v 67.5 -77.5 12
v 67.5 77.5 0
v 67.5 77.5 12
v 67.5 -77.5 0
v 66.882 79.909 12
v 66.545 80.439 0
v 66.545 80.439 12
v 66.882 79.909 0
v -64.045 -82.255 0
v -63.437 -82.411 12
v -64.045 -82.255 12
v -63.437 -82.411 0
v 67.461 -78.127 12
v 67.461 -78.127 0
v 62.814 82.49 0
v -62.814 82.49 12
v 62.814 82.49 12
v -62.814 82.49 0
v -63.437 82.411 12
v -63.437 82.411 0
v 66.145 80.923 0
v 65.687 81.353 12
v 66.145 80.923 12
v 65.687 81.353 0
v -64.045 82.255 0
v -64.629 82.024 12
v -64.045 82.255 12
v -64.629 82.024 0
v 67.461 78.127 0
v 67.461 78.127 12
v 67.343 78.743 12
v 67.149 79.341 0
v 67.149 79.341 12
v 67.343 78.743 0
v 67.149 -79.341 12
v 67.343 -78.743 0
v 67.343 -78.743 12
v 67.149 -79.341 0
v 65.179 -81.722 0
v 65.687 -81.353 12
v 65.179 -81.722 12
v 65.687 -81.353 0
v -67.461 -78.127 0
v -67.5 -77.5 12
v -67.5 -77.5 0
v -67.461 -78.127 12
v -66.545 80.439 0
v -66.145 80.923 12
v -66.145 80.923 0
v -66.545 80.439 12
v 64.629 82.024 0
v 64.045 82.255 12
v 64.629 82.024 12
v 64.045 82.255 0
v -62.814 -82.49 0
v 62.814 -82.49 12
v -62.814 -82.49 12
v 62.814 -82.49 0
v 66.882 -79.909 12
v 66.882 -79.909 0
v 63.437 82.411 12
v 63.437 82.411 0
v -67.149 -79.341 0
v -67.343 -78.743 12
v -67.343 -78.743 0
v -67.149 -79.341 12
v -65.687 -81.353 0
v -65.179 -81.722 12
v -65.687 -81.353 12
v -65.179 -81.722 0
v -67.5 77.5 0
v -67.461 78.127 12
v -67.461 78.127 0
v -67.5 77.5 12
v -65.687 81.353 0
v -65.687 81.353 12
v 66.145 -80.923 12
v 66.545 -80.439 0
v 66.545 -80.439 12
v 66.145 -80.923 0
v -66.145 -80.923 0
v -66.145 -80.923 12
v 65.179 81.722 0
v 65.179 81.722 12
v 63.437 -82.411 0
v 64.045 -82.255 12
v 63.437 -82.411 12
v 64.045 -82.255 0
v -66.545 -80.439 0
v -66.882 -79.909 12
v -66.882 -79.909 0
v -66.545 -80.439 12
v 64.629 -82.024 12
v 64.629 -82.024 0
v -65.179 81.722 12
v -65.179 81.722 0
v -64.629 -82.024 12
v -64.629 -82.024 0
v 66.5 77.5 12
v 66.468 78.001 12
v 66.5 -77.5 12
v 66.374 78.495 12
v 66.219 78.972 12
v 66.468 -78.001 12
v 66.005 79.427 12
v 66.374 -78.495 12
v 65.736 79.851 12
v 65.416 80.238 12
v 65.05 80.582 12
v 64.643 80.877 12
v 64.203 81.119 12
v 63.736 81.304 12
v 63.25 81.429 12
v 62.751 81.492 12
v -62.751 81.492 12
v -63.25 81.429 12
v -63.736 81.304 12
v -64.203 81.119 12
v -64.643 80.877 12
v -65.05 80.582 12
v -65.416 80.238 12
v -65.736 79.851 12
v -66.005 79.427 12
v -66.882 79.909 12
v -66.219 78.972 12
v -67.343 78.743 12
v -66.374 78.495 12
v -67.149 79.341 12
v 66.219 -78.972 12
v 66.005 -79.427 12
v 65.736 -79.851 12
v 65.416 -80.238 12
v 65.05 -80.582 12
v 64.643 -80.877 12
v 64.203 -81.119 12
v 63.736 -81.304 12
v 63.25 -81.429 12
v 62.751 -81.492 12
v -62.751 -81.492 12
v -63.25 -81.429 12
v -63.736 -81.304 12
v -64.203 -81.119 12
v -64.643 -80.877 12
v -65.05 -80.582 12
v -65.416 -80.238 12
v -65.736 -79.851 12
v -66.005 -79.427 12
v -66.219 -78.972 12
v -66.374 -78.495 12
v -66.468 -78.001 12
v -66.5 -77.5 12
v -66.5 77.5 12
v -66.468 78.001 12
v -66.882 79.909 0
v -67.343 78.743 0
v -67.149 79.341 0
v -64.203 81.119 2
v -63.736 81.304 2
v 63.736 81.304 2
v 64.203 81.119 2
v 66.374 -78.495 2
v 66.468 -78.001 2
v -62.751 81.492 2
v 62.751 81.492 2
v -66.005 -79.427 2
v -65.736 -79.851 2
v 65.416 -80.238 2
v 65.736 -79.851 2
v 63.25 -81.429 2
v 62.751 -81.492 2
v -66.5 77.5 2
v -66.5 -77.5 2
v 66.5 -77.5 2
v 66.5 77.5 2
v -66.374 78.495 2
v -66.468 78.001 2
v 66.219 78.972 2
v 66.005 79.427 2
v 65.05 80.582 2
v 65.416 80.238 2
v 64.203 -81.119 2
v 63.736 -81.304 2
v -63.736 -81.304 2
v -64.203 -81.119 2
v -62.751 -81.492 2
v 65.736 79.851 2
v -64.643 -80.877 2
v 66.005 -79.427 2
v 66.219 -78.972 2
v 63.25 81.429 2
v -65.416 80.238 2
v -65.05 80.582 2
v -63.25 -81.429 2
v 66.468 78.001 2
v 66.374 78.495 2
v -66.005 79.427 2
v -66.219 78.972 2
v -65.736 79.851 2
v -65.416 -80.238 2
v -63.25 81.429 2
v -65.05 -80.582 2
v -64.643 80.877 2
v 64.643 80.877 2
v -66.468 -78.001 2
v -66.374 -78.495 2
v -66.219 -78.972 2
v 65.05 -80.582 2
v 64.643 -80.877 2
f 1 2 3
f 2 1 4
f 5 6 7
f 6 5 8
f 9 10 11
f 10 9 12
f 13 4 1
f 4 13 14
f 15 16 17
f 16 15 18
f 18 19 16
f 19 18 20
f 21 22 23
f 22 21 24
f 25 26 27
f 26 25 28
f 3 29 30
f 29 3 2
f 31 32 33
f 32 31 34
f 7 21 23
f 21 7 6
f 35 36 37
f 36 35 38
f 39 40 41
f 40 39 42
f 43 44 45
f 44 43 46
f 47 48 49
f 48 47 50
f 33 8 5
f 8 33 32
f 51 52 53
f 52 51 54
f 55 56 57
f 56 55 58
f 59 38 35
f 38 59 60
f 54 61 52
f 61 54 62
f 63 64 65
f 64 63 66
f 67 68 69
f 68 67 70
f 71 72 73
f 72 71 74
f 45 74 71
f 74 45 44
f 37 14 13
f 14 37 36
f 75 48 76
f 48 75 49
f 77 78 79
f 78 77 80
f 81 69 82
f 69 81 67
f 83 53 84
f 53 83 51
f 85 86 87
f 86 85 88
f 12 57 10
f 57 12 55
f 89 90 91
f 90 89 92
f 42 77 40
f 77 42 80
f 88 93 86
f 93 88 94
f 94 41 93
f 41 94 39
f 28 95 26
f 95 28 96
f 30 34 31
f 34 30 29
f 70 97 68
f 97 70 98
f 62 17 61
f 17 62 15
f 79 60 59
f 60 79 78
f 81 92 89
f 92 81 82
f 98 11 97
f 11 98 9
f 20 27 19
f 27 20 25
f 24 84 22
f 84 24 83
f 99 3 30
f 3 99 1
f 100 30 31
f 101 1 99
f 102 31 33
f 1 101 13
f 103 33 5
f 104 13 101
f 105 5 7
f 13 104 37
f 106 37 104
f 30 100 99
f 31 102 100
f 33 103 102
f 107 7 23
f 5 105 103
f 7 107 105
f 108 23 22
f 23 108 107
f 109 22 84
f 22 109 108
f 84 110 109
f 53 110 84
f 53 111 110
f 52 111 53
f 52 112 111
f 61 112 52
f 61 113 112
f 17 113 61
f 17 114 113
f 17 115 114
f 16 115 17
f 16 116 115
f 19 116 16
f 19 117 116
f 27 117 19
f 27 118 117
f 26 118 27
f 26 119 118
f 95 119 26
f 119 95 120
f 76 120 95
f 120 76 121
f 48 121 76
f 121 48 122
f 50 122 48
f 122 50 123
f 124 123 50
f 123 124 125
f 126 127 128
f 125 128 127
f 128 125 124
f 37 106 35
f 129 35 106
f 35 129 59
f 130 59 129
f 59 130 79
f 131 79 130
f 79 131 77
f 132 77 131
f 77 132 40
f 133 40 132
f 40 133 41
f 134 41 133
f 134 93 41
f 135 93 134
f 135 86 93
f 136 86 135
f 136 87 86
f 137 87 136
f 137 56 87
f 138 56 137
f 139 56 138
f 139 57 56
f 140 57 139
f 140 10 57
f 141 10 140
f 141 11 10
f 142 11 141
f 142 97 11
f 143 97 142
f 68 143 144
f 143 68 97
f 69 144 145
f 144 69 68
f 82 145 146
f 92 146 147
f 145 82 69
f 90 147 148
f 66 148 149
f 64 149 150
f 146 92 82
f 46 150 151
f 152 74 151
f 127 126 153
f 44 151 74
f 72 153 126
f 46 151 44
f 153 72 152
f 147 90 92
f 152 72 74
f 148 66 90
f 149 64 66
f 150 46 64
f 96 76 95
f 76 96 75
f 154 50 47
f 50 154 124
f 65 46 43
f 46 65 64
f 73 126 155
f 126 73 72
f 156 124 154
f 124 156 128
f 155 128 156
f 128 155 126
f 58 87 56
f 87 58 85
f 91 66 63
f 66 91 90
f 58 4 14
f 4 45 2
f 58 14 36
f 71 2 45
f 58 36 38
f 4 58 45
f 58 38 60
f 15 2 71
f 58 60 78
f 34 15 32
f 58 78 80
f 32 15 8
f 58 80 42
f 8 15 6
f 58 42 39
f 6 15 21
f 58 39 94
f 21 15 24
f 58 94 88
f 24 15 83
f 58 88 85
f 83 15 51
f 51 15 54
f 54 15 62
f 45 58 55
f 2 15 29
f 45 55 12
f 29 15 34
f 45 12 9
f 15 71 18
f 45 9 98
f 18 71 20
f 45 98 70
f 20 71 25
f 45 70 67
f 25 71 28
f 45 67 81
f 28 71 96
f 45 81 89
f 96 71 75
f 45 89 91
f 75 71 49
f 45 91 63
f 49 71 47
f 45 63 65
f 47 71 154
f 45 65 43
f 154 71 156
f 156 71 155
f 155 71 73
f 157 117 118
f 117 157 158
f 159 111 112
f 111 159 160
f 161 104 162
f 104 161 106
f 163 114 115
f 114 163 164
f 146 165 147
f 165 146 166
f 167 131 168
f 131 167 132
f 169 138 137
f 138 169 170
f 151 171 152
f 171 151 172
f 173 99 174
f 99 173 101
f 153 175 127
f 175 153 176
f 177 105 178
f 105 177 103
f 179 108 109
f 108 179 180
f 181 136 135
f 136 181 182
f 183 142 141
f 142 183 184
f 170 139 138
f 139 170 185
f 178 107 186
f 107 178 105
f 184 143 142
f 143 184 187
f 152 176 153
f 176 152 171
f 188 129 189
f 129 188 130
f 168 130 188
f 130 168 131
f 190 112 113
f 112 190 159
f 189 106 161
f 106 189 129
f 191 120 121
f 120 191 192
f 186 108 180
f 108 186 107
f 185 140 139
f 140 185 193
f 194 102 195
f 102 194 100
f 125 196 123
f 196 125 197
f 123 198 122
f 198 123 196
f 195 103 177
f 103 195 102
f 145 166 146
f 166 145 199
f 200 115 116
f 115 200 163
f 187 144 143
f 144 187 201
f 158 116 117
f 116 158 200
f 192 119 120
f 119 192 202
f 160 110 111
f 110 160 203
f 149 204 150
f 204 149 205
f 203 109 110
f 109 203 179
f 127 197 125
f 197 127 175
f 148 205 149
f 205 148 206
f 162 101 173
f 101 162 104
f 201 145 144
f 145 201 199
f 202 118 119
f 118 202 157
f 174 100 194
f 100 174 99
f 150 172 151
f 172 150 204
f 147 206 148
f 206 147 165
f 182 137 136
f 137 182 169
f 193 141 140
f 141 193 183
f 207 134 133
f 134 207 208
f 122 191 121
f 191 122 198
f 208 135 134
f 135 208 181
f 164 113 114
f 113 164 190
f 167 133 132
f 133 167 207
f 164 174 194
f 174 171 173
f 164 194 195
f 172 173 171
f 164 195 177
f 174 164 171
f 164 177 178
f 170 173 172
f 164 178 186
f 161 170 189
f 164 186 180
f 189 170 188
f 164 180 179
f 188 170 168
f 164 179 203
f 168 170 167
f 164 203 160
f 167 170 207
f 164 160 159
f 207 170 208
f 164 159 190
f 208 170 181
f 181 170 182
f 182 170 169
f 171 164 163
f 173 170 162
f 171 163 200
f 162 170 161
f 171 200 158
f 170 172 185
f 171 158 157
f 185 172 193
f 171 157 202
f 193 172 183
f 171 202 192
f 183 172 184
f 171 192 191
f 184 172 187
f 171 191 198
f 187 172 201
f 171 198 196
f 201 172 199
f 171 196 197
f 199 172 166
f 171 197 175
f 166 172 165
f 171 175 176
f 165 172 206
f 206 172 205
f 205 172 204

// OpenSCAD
$fn = 50;


difference() {
	union() {
		hull() {
			translate(v = [-62.5000000000, 77.5000000000, 0]) {
				cylinder(h = 12, r = 5);
			}
			translate(v = [62.5000000000, 77.5000000000, 0]) {
				cylinder(h = 12, r = 5);
			}
			translate(v = [-62.5000000000, -77.5000000000, 0]) {
				cylinder(h = 12, r = 5);
			}
			translate(v = [62.5000000000, -77.5000000000, 0]) {
				cylinder(h = 12, r = 5);
			}
		}
	}
	union() {
		translate(v = [0, 0, 2]) {
			hull() {
				translate(v = [-62.5000000000, 77.5000000000, 0]) {
					cylinder(h = 10, r = 4);
				}
				translate(v = [62.5000000000, 77.5000000000, 0]) {
					cylinder(h = 10, r = 4);
				}
				translate(v = [-62.5000000000, -77.5000000000, 0]) {
					cylinder(h = 10, r = 4);
				}
				translate(v = [62.5000000000, -77.5000000000, 0]) {
					cylinder(h = 10, r = 4);
				}
			}
		}
	}
}
